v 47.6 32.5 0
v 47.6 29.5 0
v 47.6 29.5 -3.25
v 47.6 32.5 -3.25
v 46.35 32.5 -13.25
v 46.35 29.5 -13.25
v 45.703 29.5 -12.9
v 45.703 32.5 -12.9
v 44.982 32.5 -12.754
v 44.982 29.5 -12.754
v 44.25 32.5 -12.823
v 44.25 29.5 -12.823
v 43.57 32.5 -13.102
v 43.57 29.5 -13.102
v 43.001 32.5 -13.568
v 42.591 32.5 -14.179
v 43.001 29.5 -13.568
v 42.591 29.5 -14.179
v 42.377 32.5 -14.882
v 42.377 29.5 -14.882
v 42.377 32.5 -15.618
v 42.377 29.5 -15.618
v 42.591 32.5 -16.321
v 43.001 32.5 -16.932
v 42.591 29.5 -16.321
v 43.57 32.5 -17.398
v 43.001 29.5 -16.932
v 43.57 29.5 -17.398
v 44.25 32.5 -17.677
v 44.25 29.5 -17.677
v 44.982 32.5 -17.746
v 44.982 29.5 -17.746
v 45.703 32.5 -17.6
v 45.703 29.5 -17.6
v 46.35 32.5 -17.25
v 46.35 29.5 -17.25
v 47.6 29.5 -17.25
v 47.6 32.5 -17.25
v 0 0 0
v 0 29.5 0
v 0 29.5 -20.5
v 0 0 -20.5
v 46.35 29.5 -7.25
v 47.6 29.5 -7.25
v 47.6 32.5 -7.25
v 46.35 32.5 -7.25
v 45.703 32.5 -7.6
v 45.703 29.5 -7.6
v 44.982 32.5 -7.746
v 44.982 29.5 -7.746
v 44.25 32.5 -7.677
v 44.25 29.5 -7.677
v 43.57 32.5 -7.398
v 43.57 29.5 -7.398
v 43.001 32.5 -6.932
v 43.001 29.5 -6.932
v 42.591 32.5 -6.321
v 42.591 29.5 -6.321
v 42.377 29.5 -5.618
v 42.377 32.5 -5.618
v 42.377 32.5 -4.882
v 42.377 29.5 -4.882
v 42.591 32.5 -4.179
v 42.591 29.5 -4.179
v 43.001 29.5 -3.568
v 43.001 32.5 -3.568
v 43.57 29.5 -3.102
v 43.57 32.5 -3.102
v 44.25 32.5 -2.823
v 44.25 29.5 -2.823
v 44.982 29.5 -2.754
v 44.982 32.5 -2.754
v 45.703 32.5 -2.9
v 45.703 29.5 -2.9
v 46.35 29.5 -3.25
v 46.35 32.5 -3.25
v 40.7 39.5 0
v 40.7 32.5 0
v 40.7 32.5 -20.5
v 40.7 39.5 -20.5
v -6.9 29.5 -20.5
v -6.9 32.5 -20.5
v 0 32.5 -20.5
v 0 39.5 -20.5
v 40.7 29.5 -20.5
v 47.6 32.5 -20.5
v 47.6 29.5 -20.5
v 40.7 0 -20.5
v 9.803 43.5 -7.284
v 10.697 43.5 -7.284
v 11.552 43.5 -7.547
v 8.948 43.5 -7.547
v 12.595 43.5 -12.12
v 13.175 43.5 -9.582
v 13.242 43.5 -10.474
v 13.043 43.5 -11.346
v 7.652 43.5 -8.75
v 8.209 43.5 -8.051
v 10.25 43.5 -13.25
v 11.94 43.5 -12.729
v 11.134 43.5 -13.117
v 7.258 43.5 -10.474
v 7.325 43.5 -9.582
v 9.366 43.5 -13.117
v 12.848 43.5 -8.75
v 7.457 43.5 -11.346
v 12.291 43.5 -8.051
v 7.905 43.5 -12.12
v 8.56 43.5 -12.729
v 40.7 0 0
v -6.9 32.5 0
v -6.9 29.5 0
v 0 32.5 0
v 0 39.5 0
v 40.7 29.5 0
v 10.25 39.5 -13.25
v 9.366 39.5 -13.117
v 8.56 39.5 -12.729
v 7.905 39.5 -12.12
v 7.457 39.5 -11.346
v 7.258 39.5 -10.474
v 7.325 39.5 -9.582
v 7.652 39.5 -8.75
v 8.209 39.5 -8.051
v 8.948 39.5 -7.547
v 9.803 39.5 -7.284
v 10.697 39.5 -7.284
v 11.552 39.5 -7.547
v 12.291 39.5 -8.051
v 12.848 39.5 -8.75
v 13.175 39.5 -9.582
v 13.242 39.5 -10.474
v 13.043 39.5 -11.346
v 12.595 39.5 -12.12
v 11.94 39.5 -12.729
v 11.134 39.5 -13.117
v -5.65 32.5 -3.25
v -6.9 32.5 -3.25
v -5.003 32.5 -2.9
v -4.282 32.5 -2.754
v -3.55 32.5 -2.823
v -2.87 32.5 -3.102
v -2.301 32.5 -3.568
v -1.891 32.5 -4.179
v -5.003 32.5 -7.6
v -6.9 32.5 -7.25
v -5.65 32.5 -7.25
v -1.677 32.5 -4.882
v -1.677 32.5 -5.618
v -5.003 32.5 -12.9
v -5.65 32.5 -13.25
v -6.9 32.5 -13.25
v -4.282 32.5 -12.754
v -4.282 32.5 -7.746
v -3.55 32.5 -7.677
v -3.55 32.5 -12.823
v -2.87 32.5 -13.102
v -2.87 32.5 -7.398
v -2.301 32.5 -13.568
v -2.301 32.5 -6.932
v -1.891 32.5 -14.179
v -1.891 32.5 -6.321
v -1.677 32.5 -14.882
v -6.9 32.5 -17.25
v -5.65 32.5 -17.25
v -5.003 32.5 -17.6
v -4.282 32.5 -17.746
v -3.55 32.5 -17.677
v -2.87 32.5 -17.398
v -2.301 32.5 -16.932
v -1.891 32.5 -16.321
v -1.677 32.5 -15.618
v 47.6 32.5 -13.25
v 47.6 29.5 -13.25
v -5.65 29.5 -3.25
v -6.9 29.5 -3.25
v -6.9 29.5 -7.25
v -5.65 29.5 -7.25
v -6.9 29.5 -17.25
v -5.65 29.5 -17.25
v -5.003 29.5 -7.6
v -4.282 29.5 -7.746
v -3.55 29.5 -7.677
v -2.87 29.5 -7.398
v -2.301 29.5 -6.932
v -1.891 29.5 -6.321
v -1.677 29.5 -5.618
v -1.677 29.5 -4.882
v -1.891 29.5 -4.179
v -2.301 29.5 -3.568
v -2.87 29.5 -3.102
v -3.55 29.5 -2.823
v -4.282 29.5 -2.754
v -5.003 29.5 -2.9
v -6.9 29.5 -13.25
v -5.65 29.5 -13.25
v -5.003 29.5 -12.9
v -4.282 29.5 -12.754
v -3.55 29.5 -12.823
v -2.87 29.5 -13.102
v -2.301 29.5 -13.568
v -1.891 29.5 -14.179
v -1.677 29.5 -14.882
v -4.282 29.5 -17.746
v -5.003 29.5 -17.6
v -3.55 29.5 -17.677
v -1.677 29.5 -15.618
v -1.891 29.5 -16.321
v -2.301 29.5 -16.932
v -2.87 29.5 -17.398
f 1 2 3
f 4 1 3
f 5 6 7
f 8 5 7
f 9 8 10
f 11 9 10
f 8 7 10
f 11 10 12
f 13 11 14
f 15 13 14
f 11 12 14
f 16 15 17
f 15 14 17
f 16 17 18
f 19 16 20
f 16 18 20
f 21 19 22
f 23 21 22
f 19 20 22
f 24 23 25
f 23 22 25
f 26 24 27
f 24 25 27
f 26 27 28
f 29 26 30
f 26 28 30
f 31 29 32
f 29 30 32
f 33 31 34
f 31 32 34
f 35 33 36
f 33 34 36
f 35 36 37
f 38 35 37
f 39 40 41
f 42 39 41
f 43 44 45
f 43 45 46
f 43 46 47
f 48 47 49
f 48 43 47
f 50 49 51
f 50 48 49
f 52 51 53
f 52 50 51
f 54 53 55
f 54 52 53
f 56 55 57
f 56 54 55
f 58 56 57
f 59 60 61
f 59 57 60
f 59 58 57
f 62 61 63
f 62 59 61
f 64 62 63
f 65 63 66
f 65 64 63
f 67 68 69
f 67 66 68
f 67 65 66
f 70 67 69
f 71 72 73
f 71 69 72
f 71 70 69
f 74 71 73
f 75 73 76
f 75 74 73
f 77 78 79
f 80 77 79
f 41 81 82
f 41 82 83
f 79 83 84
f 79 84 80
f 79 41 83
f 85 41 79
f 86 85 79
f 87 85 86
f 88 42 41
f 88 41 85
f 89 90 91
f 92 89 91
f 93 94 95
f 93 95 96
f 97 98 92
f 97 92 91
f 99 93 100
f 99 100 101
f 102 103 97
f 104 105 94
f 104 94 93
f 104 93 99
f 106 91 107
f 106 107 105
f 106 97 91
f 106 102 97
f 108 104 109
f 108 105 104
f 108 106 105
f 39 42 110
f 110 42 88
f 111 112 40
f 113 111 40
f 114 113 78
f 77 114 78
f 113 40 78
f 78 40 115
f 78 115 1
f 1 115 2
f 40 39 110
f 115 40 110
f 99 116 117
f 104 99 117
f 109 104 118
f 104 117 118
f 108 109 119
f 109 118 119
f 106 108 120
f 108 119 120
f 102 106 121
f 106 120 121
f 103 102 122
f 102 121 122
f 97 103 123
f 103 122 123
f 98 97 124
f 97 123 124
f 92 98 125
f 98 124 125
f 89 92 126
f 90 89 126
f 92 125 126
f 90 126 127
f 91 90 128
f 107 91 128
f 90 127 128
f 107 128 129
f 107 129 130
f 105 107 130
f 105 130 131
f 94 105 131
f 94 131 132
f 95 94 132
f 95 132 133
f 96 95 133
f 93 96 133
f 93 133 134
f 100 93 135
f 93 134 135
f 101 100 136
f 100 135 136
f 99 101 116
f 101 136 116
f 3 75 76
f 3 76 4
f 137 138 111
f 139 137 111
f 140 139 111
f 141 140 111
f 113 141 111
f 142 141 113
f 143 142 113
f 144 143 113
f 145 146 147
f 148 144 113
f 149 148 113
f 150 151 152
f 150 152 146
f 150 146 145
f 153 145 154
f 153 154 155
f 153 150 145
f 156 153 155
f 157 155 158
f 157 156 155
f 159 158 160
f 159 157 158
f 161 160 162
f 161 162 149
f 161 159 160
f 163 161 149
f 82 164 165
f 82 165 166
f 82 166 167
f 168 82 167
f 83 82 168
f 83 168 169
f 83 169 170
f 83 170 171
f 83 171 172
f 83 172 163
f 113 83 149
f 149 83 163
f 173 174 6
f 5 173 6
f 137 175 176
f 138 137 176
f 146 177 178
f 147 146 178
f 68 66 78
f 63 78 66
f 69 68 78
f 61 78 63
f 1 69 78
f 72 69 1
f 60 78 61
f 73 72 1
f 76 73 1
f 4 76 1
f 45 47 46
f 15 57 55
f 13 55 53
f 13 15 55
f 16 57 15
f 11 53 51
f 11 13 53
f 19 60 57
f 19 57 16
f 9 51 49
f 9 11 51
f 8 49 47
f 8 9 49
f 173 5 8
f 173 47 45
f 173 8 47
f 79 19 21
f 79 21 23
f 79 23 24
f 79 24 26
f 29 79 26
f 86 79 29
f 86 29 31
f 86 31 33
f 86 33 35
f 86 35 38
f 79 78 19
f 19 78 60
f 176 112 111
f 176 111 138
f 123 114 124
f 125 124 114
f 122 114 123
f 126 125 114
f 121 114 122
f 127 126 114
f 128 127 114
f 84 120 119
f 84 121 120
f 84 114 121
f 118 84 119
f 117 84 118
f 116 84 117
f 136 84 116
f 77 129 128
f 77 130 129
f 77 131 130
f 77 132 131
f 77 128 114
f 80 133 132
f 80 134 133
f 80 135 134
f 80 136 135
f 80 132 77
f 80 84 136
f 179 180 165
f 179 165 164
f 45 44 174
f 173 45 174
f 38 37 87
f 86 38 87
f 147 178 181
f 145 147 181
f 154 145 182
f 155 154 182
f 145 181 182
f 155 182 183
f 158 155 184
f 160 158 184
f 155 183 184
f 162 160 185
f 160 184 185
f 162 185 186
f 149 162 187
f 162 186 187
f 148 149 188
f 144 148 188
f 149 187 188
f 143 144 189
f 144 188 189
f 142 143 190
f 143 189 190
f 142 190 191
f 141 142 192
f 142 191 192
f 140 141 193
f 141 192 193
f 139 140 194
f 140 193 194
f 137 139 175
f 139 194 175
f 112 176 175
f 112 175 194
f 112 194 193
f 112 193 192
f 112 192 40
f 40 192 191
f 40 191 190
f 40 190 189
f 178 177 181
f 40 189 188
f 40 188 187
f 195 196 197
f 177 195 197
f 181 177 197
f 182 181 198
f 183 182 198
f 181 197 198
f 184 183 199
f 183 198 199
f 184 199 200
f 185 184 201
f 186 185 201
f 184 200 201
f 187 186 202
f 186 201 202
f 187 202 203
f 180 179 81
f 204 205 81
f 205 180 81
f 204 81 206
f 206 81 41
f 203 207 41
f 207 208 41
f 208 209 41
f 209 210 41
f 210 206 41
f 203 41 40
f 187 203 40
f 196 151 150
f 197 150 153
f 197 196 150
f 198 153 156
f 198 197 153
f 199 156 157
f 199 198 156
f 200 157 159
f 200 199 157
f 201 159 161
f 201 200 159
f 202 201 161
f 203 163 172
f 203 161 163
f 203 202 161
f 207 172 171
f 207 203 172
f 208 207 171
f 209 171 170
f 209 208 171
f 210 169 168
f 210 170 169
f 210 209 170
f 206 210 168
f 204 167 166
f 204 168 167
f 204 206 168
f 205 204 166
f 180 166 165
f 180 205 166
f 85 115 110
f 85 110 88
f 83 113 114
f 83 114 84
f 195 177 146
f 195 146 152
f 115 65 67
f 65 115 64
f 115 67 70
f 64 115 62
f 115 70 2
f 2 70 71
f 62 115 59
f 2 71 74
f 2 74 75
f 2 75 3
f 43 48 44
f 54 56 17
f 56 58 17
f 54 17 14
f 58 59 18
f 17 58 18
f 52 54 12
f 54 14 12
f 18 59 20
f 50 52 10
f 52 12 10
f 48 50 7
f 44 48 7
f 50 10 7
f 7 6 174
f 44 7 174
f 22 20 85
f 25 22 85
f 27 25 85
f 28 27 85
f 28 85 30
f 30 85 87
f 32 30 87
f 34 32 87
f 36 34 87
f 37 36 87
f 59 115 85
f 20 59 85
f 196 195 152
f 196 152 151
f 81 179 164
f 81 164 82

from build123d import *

# Parameters (mm, degrees)
SKETCH1_W            = 40.7
SKETCH1_H            = 20.5
BOSS_EXTRUDE1_DEPTH  = 39.5
SKETCH2_R            = 3
BOSS_EXTRUDE2_DEPTH  = 4
SKETCH3_W            = 54.5
SKETCH3_H            = 20.5
BOSS_EXTRUDE3_DEPTH  = 3
CUT_EXTRUDE1_DEPTH   = 60.634386054
MIRROR2_COPY_1_DEPTH = 60.634386054


with BuildPart() as part:
    # Sketch1 → Boss-Extrude1 (new body)
    with BuildSketch(Plane(origin=(0, 0, 0), x_dir=(1, 0, 0), z_dir=(0, 1, 0))):
        with Locations((20.35, 10.25)):
            Rectangle(SKETCH1_W, SKETCH1_H)
    extrude(amount=BOSS_EXTRUDE1_DEPTH)

    # Sketch2 → Boss-Extrude2 (add)
    with BuildSketch(Plane(origin=(0, 39.5, 0), x_dir=(1, 0, 0), z_dir=(0, 1, 0))):
        with Locations(Location((10.25, 10.25, 0), (0, 0, 90))):
            Circle(SKETCH2_R)
    extrude(amount=BOSS_EXTRUDE2_DEPTH)

    # Sketch3 → Boss-Extrude3 (add)
    with BuildSketch(Plane(origin=(0, 29.5, 0), x_dir=(1, 0, 0), z_dir=(0, 1, 0))):
        with Locations((20.35, 10.25)):
            Rectangle(SKETCH3_W, SKETCH3_H)
    extrude(amount=BOSS_EXTRUDE3_DEPTH)

    # Sketch4 → Cut-Extrude1 (cut, through all)
    with BuildSketch(Plane(origin=(0, 29.5, 0), x_dir=(1, 0, 0), z_dir=(0, 1, 0))):
        with BuildLine():
            Line((-5.65, 17.25), (-6.9, 17.25))
            Line((-6.9, 17.25), (-6.9, 13.25))
            Line((-6.9, 13.25), (-5.65, 13.25))
            ThreePointArc((-5.65, 13.25), (-1.65, 15.25), (-5.65, 17.25))
        make_face()
    cut_extrude1 = extrude(amount=CUT_EXTRUDE1_DEPTH, mode=Mode.SUBTRACT)

    # Mirror1: Cut-Extrude1 across plane
    add(cut_extrude1.mirror(Plane(origin=(0, 0, -10.25), x_dir=(1, 0, 0), z_dir=(0, 0, -1))), mode=Mode.SUBTRACT)

    # Mirror2: Cut-Extrude1 across plane
    add(cut_extrude1.mirror(Plane(origin=(20.35, 0, 0), x_dir=(0, 0, 1), z_dir=(1, 0, 0))), mode=Mode.SUBTRACT)

    # Mirror2 copy 1 sketch → Mirror2 copy 1 (cut, through all)
    with BuildSketch(Plane(origin=(40.7, 29.5, -20.5), x_dir=(-1, 0, 0), z_dir=(0, 1, 0))):
        with BuildLine():
            Line((-5.65, 17.25), (-6.9, 17.25))
            Line((-6.9, 17.25), (-6.9, 13.25))
            Line((-6.9, 13.25), (-5.65, 13.25))
            ThreePointArc((-5.65, 13.25), (-1.65, 15.25), (-5.65, 17.25))
        make_face()
    extrude(amount=MIRROR2_COPY_1_DEPTH, mode=Mode.SUBTRACT)


solid = part.part
